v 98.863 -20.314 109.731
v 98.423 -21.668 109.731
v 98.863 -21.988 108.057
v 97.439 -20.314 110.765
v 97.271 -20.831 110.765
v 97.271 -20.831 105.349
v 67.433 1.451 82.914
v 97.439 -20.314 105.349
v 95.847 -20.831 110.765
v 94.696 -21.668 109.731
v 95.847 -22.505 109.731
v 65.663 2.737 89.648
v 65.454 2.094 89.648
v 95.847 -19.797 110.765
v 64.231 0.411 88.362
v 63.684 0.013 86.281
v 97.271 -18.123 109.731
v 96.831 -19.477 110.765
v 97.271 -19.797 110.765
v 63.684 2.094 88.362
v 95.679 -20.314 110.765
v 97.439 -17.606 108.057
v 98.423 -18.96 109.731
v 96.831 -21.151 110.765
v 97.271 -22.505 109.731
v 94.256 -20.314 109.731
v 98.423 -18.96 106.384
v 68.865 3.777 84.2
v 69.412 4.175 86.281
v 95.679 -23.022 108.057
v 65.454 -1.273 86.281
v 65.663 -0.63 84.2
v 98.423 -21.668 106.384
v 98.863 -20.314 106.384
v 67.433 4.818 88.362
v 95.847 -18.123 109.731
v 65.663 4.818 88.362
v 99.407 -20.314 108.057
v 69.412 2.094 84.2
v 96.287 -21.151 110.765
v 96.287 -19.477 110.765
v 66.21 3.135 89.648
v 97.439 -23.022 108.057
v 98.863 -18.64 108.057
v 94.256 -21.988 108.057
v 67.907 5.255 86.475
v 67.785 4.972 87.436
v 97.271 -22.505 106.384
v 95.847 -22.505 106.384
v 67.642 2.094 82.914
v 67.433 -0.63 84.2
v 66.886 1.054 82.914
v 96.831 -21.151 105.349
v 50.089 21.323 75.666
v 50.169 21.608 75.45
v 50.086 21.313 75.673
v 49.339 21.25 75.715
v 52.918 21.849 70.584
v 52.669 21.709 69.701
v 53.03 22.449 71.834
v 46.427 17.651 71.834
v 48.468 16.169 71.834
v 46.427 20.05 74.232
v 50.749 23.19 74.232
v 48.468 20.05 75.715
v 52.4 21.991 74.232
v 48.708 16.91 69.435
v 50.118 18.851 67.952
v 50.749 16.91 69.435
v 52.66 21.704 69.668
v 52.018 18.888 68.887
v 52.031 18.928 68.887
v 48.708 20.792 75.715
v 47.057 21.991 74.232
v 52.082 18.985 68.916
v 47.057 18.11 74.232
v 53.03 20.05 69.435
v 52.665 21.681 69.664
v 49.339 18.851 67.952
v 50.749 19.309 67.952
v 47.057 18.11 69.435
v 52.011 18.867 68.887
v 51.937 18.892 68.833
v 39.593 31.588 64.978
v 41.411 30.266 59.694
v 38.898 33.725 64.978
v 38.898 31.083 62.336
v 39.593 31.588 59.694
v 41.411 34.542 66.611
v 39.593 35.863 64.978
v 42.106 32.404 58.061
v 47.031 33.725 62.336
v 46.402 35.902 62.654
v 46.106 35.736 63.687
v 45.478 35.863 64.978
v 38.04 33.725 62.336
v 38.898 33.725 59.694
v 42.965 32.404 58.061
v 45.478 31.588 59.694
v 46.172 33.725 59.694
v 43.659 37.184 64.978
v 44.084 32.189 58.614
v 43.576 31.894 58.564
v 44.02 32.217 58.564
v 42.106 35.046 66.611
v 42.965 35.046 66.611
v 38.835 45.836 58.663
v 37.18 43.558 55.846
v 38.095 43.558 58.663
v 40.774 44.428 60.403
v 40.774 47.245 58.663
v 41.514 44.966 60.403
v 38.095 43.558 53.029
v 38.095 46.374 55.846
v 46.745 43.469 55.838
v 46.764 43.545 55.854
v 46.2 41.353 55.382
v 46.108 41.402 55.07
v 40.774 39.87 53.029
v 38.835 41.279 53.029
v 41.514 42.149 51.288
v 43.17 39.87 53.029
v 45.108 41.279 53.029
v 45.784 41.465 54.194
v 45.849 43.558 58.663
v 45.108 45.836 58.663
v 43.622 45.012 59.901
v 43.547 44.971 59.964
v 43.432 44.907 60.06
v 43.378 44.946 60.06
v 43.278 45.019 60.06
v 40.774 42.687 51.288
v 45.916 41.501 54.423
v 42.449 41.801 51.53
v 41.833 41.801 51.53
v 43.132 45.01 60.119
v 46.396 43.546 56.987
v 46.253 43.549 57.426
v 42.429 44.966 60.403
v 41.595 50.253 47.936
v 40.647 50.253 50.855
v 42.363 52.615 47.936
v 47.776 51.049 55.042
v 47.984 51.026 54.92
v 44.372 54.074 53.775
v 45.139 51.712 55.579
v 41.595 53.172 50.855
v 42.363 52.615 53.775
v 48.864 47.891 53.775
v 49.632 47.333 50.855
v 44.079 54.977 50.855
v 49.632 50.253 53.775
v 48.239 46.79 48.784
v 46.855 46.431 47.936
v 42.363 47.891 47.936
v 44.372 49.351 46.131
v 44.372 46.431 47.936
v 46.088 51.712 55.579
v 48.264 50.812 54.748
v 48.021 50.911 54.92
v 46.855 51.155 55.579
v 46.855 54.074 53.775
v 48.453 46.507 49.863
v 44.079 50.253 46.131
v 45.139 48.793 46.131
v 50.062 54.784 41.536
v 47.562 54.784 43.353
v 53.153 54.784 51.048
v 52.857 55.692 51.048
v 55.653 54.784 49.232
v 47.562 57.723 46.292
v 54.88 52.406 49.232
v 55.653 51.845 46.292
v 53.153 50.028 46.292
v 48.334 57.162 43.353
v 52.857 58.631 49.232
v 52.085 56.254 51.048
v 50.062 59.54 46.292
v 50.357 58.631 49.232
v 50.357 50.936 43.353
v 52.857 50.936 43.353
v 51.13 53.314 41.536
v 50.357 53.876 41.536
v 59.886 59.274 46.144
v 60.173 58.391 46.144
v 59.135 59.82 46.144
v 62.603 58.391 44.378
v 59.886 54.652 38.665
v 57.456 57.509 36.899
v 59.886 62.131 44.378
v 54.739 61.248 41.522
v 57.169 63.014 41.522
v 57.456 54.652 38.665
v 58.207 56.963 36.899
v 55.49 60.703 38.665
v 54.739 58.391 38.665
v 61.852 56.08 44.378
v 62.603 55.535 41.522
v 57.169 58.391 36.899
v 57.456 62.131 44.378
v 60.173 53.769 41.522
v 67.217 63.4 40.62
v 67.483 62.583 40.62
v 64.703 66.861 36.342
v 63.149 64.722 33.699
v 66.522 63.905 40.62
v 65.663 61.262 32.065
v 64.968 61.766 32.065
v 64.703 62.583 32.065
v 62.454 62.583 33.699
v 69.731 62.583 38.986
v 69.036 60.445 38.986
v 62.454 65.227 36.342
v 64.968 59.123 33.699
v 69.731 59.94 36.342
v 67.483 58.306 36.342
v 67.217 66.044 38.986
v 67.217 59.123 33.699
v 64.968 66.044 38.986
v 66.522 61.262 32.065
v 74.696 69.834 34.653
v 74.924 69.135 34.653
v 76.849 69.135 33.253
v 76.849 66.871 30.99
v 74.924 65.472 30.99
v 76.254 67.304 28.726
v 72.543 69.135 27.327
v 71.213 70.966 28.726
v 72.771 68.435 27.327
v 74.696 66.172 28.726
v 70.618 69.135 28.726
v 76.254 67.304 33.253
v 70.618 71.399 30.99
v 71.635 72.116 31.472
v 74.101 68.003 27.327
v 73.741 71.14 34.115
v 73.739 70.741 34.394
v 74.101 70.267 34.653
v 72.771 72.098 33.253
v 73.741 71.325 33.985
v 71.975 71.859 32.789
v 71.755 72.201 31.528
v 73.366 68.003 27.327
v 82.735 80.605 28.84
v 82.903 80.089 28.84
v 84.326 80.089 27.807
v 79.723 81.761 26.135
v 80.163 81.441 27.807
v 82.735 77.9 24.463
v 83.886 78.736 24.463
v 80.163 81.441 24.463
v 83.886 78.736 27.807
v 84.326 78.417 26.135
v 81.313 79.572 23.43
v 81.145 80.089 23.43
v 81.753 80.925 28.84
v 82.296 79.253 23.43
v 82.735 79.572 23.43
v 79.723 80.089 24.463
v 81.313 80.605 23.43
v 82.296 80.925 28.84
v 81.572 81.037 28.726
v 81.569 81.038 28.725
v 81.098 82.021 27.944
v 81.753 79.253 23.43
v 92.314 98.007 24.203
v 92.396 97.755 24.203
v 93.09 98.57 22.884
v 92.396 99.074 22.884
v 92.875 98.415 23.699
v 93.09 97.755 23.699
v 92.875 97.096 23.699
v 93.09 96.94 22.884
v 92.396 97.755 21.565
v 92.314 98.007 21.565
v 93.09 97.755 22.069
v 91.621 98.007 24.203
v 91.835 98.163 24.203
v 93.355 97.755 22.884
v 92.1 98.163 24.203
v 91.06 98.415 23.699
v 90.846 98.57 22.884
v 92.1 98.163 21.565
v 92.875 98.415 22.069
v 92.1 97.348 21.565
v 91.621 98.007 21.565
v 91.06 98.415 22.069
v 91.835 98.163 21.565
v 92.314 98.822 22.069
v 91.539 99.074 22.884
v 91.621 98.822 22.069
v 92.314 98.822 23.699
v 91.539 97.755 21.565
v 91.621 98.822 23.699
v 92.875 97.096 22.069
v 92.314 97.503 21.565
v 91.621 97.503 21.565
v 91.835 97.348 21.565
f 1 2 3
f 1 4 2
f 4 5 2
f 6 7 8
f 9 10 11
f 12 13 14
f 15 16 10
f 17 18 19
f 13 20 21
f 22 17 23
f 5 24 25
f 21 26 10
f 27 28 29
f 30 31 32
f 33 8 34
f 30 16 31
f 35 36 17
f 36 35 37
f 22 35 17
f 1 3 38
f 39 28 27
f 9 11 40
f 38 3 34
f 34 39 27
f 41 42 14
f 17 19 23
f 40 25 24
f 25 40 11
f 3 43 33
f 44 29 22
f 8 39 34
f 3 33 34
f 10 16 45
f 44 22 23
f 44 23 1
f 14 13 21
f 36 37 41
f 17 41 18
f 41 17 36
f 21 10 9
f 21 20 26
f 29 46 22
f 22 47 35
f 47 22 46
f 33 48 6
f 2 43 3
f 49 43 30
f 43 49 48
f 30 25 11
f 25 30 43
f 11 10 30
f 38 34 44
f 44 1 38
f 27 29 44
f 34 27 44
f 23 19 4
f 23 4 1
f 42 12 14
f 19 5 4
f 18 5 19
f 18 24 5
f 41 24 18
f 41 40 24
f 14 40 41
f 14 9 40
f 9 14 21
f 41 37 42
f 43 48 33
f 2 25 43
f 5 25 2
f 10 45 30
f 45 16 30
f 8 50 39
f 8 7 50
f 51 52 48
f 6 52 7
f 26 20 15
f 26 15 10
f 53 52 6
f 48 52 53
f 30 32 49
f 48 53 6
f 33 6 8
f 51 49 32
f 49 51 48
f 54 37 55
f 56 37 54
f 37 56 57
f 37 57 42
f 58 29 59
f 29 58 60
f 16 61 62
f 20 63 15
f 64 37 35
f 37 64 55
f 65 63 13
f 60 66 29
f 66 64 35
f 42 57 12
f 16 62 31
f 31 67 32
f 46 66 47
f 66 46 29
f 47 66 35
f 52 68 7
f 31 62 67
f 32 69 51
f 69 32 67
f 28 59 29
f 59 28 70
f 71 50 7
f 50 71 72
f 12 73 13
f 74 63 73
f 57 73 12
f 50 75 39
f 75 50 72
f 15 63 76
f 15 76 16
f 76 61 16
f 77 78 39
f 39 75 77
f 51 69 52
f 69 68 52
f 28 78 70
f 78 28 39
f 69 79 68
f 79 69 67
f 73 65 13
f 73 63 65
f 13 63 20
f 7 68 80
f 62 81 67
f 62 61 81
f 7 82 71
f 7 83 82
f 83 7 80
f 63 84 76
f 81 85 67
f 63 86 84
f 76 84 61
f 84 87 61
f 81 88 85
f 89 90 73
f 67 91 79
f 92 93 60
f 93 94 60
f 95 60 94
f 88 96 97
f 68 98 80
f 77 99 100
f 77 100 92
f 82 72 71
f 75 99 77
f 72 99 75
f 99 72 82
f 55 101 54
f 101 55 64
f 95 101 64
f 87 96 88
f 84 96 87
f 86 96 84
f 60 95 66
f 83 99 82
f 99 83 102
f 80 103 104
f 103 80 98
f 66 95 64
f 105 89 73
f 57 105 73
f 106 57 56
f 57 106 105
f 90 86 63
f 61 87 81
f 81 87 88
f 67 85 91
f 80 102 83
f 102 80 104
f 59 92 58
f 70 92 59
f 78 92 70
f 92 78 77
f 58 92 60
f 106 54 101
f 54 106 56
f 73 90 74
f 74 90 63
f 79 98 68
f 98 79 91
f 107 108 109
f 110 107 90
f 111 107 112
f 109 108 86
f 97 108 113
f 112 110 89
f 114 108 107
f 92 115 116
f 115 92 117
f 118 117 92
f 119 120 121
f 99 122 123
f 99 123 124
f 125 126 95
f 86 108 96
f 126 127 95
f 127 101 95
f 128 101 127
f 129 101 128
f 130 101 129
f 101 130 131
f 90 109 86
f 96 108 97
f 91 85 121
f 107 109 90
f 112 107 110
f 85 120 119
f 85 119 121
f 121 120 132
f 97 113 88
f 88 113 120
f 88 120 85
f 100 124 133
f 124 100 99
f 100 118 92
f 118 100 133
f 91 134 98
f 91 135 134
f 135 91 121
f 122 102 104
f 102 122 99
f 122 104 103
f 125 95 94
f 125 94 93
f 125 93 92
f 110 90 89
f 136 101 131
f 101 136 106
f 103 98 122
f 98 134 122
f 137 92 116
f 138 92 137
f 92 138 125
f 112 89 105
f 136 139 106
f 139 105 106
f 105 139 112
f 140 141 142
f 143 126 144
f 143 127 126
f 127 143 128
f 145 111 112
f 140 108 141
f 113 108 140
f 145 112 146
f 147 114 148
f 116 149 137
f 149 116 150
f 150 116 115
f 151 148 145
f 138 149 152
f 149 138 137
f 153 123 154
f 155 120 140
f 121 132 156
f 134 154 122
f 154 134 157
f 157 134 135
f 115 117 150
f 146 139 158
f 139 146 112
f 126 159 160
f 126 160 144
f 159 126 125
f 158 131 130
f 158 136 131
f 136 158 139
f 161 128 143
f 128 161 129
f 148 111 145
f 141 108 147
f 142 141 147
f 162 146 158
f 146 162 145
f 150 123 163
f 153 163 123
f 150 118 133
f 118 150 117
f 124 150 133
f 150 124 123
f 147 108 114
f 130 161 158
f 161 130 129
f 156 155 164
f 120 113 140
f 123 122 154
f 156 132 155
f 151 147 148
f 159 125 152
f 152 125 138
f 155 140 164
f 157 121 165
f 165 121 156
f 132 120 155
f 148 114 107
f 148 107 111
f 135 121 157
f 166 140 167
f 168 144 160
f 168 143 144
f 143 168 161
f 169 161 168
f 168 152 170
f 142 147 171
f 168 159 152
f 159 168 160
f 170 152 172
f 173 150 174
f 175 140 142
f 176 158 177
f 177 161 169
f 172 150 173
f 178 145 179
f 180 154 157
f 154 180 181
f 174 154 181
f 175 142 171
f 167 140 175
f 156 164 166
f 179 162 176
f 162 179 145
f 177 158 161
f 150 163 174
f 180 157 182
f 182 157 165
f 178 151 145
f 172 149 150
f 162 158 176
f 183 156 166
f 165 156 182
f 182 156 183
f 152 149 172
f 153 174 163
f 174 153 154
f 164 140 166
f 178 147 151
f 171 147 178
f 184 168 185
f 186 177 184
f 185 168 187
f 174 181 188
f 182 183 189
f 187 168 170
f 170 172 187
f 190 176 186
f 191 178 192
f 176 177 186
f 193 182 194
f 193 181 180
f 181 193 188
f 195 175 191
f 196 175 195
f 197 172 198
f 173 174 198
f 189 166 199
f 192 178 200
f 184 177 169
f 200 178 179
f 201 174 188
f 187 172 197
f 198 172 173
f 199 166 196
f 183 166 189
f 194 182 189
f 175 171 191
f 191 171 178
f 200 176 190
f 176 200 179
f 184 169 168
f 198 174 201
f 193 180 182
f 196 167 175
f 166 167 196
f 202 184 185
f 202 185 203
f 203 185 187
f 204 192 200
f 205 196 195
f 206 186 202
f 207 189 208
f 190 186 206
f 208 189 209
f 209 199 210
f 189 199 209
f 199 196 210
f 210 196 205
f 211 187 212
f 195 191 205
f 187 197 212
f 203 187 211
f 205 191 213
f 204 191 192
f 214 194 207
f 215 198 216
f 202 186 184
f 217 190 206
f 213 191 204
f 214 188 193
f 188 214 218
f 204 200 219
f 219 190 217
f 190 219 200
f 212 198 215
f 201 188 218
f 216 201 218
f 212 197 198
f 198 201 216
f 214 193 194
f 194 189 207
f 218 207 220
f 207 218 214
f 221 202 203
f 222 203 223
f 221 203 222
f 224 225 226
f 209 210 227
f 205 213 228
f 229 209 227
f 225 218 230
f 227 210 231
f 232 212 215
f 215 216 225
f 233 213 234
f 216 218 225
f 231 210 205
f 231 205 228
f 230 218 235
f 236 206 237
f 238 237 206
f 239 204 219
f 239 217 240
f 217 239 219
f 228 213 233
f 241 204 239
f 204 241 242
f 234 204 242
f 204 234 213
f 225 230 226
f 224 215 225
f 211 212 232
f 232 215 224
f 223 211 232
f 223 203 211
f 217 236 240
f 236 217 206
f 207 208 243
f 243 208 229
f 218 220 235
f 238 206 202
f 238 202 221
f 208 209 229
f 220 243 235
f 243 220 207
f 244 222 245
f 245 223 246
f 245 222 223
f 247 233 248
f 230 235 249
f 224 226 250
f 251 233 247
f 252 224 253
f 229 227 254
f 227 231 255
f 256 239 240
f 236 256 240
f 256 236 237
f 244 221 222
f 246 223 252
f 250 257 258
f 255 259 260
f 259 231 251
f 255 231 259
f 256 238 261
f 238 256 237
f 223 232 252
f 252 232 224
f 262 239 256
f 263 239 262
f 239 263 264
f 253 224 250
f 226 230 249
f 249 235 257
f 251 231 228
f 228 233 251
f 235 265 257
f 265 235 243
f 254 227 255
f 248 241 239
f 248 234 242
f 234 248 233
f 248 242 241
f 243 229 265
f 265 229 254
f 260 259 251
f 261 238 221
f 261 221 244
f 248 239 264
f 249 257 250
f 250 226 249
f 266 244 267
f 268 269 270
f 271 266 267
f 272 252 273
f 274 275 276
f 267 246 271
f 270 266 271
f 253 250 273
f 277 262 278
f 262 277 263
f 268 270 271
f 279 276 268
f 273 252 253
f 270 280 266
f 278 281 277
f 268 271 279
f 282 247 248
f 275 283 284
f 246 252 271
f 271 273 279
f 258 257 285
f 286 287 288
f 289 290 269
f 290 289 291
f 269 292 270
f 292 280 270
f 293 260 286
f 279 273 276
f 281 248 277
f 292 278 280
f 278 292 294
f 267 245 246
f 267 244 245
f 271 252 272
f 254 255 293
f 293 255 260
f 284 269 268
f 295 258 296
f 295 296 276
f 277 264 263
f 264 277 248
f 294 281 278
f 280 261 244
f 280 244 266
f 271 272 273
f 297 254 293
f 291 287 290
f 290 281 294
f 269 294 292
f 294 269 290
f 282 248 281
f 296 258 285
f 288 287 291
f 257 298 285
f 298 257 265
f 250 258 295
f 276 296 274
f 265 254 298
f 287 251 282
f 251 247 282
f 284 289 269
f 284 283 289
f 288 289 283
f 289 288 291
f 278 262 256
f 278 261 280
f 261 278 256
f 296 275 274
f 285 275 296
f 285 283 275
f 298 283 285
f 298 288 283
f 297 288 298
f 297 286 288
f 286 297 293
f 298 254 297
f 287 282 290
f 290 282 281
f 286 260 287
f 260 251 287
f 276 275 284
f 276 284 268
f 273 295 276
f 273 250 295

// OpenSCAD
v1=[rands(0,100,1)[0],rands(0,100,1)[0],rands(0,100,1)[0],rands(1,20,1)[0]];
v2=[rands(0,100,1)[0],rands(0,100,1)[0],rands(0,100,1)[0],rands(1,20,1)[0]];
v3=[rands(0,100,1)[0],rands(0,100,1)[0],rands(0,100,1)[0],rands(1,20,1)[0]];
v4=[rands(0,100,1)[0],rands(0,100,1)[0],rands(0,100,1)[0],rands(1,20,1)[0]];
v5=[rands(0,100,1)[0],rands(0,100,1)[0],rands(0,100,1)[0],rands(1,20,1)[0]];


module bez(t,v){
    unt=1-t;
    if (len(v)>1){
   v2 = [ for (i = [0 : 1 : len(v)-2])v[i]*t+v[i+1]*unt ];
    bez(t,v2);
    
    
    }else{echo (v[0]);
        p=v[0];
       translate([p[0],p[1],p[2],]) sphere(d=p[3],$fn=10);}
    }



module bline(v){
    union(){for (i=[0:0.1:1])
    {
        hull(){
            bez(i,v);
            bez(i-0.1,v);
        }
        
        }  }  
    
    
    }
    
  bline([v1,v2,v3,v4,v5]);  
